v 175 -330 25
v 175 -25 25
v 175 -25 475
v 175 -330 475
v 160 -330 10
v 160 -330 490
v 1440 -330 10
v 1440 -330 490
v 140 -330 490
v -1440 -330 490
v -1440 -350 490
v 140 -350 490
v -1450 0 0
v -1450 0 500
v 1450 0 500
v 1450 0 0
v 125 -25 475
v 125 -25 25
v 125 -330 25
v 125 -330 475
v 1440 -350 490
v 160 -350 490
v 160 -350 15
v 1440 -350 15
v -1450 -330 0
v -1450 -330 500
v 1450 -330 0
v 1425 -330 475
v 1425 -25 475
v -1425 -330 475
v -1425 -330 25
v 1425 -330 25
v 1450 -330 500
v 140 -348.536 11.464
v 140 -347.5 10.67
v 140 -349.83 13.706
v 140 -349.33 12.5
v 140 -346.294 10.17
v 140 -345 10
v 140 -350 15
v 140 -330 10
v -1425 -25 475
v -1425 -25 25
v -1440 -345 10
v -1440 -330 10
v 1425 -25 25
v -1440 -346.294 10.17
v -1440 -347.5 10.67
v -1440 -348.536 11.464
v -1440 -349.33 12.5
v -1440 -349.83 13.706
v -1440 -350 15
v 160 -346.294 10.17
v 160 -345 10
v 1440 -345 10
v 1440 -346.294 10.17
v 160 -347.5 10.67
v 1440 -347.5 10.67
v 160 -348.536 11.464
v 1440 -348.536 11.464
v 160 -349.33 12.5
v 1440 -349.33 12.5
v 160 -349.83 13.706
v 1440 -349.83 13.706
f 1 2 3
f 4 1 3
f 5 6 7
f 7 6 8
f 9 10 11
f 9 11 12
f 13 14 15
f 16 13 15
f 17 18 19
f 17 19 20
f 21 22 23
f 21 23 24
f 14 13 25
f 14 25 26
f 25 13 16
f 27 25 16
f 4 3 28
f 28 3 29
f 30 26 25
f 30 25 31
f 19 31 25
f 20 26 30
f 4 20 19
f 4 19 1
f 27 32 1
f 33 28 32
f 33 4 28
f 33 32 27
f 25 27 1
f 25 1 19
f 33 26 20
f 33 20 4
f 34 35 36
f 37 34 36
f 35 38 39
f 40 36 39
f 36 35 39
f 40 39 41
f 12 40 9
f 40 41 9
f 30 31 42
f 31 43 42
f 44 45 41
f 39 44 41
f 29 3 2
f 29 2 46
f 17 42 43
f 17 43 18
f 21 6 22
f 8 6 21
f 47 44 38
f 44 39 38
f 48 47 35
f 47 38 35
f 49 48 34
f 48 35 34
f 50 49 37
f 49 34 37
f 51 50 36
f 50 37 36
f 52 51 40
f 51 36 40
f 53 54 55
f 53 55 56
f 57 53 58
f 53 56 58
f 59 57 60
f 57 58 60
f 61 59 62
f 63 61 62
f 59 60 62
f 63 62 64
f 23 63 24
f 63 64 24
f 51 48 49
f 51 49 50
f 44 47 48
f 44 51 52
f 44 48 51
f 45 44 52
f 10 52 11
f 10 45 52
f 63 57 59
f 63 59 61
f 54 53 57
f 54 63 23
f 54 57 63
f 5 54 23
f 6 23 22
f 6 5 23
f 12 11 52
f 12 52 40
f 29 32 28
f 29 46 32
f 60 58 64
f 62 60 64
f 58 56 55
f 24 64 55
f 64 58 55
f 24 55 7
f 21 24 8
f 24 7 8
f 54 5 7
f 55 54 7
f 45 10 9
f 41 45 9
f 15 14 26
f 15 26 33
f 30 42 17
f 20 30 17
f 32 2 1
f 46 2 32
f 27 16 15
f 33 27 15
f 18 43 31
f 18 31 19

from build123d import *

# Parameters (mm, degrees)
F0_W     = 2900
F0_H     = 500
F1_DEPTH = 330
F2_T     = -25
F3_W     = 25
F3_H     = 450
F4_DEPTH = 305
F5_W     = 1580
F5_H     = 480
F5_W_2   = 1280
F6_DEPTH = 20
F7_R     = 5


with BuildPart() as f1:
    # F0 (on Front) → F1 (new body)
    with BuildSketch(Plane.XZ):
        with Locations((0, 250)):
            Rectangle(F0_W, F0_H)
    extrude(amount=F1_DEPTH)

    # F2
    f2_openings = [f1.faces().sort_by_distance(p)[0] for p in [
        (0, -330, 250),
    ]]
    offset(amount=F2_T, openings=f2_openings)

    # F3 (on face) → F4 (join, through all)
    with BuildSketch(Plane.XZ.offset(25)):
        with Locations((137.5, 250)):
            Rectangle(F3_W, F3_H)
        with Locations((162.5, 250)):
            Rectangle(F3_W, F3_H)
    extrude(amount=F4_DEPTH)


with BuildPart() as f6:
    # F5 (on face) → F6 (new body)
    with BuildSketch(Plane.XZ.offset(330)):
        with Locations((-650, 250)):
            Rectangle(F5_W, F5_H)
        with Locations((800, 250)):
            Rectangle(F5_W_2, F5_H)
    extrude(amount=F6_DEPTH)

    # F7
    f7_edges = [f6.edges().sort_by_distance(p)[0] for p in [
        (-650, -350, 10),
        (800, -350, 10),
    ]]
    fillet(f7_edges, radius=F7_R)


solid = Compound([f1.part, f6.part])
